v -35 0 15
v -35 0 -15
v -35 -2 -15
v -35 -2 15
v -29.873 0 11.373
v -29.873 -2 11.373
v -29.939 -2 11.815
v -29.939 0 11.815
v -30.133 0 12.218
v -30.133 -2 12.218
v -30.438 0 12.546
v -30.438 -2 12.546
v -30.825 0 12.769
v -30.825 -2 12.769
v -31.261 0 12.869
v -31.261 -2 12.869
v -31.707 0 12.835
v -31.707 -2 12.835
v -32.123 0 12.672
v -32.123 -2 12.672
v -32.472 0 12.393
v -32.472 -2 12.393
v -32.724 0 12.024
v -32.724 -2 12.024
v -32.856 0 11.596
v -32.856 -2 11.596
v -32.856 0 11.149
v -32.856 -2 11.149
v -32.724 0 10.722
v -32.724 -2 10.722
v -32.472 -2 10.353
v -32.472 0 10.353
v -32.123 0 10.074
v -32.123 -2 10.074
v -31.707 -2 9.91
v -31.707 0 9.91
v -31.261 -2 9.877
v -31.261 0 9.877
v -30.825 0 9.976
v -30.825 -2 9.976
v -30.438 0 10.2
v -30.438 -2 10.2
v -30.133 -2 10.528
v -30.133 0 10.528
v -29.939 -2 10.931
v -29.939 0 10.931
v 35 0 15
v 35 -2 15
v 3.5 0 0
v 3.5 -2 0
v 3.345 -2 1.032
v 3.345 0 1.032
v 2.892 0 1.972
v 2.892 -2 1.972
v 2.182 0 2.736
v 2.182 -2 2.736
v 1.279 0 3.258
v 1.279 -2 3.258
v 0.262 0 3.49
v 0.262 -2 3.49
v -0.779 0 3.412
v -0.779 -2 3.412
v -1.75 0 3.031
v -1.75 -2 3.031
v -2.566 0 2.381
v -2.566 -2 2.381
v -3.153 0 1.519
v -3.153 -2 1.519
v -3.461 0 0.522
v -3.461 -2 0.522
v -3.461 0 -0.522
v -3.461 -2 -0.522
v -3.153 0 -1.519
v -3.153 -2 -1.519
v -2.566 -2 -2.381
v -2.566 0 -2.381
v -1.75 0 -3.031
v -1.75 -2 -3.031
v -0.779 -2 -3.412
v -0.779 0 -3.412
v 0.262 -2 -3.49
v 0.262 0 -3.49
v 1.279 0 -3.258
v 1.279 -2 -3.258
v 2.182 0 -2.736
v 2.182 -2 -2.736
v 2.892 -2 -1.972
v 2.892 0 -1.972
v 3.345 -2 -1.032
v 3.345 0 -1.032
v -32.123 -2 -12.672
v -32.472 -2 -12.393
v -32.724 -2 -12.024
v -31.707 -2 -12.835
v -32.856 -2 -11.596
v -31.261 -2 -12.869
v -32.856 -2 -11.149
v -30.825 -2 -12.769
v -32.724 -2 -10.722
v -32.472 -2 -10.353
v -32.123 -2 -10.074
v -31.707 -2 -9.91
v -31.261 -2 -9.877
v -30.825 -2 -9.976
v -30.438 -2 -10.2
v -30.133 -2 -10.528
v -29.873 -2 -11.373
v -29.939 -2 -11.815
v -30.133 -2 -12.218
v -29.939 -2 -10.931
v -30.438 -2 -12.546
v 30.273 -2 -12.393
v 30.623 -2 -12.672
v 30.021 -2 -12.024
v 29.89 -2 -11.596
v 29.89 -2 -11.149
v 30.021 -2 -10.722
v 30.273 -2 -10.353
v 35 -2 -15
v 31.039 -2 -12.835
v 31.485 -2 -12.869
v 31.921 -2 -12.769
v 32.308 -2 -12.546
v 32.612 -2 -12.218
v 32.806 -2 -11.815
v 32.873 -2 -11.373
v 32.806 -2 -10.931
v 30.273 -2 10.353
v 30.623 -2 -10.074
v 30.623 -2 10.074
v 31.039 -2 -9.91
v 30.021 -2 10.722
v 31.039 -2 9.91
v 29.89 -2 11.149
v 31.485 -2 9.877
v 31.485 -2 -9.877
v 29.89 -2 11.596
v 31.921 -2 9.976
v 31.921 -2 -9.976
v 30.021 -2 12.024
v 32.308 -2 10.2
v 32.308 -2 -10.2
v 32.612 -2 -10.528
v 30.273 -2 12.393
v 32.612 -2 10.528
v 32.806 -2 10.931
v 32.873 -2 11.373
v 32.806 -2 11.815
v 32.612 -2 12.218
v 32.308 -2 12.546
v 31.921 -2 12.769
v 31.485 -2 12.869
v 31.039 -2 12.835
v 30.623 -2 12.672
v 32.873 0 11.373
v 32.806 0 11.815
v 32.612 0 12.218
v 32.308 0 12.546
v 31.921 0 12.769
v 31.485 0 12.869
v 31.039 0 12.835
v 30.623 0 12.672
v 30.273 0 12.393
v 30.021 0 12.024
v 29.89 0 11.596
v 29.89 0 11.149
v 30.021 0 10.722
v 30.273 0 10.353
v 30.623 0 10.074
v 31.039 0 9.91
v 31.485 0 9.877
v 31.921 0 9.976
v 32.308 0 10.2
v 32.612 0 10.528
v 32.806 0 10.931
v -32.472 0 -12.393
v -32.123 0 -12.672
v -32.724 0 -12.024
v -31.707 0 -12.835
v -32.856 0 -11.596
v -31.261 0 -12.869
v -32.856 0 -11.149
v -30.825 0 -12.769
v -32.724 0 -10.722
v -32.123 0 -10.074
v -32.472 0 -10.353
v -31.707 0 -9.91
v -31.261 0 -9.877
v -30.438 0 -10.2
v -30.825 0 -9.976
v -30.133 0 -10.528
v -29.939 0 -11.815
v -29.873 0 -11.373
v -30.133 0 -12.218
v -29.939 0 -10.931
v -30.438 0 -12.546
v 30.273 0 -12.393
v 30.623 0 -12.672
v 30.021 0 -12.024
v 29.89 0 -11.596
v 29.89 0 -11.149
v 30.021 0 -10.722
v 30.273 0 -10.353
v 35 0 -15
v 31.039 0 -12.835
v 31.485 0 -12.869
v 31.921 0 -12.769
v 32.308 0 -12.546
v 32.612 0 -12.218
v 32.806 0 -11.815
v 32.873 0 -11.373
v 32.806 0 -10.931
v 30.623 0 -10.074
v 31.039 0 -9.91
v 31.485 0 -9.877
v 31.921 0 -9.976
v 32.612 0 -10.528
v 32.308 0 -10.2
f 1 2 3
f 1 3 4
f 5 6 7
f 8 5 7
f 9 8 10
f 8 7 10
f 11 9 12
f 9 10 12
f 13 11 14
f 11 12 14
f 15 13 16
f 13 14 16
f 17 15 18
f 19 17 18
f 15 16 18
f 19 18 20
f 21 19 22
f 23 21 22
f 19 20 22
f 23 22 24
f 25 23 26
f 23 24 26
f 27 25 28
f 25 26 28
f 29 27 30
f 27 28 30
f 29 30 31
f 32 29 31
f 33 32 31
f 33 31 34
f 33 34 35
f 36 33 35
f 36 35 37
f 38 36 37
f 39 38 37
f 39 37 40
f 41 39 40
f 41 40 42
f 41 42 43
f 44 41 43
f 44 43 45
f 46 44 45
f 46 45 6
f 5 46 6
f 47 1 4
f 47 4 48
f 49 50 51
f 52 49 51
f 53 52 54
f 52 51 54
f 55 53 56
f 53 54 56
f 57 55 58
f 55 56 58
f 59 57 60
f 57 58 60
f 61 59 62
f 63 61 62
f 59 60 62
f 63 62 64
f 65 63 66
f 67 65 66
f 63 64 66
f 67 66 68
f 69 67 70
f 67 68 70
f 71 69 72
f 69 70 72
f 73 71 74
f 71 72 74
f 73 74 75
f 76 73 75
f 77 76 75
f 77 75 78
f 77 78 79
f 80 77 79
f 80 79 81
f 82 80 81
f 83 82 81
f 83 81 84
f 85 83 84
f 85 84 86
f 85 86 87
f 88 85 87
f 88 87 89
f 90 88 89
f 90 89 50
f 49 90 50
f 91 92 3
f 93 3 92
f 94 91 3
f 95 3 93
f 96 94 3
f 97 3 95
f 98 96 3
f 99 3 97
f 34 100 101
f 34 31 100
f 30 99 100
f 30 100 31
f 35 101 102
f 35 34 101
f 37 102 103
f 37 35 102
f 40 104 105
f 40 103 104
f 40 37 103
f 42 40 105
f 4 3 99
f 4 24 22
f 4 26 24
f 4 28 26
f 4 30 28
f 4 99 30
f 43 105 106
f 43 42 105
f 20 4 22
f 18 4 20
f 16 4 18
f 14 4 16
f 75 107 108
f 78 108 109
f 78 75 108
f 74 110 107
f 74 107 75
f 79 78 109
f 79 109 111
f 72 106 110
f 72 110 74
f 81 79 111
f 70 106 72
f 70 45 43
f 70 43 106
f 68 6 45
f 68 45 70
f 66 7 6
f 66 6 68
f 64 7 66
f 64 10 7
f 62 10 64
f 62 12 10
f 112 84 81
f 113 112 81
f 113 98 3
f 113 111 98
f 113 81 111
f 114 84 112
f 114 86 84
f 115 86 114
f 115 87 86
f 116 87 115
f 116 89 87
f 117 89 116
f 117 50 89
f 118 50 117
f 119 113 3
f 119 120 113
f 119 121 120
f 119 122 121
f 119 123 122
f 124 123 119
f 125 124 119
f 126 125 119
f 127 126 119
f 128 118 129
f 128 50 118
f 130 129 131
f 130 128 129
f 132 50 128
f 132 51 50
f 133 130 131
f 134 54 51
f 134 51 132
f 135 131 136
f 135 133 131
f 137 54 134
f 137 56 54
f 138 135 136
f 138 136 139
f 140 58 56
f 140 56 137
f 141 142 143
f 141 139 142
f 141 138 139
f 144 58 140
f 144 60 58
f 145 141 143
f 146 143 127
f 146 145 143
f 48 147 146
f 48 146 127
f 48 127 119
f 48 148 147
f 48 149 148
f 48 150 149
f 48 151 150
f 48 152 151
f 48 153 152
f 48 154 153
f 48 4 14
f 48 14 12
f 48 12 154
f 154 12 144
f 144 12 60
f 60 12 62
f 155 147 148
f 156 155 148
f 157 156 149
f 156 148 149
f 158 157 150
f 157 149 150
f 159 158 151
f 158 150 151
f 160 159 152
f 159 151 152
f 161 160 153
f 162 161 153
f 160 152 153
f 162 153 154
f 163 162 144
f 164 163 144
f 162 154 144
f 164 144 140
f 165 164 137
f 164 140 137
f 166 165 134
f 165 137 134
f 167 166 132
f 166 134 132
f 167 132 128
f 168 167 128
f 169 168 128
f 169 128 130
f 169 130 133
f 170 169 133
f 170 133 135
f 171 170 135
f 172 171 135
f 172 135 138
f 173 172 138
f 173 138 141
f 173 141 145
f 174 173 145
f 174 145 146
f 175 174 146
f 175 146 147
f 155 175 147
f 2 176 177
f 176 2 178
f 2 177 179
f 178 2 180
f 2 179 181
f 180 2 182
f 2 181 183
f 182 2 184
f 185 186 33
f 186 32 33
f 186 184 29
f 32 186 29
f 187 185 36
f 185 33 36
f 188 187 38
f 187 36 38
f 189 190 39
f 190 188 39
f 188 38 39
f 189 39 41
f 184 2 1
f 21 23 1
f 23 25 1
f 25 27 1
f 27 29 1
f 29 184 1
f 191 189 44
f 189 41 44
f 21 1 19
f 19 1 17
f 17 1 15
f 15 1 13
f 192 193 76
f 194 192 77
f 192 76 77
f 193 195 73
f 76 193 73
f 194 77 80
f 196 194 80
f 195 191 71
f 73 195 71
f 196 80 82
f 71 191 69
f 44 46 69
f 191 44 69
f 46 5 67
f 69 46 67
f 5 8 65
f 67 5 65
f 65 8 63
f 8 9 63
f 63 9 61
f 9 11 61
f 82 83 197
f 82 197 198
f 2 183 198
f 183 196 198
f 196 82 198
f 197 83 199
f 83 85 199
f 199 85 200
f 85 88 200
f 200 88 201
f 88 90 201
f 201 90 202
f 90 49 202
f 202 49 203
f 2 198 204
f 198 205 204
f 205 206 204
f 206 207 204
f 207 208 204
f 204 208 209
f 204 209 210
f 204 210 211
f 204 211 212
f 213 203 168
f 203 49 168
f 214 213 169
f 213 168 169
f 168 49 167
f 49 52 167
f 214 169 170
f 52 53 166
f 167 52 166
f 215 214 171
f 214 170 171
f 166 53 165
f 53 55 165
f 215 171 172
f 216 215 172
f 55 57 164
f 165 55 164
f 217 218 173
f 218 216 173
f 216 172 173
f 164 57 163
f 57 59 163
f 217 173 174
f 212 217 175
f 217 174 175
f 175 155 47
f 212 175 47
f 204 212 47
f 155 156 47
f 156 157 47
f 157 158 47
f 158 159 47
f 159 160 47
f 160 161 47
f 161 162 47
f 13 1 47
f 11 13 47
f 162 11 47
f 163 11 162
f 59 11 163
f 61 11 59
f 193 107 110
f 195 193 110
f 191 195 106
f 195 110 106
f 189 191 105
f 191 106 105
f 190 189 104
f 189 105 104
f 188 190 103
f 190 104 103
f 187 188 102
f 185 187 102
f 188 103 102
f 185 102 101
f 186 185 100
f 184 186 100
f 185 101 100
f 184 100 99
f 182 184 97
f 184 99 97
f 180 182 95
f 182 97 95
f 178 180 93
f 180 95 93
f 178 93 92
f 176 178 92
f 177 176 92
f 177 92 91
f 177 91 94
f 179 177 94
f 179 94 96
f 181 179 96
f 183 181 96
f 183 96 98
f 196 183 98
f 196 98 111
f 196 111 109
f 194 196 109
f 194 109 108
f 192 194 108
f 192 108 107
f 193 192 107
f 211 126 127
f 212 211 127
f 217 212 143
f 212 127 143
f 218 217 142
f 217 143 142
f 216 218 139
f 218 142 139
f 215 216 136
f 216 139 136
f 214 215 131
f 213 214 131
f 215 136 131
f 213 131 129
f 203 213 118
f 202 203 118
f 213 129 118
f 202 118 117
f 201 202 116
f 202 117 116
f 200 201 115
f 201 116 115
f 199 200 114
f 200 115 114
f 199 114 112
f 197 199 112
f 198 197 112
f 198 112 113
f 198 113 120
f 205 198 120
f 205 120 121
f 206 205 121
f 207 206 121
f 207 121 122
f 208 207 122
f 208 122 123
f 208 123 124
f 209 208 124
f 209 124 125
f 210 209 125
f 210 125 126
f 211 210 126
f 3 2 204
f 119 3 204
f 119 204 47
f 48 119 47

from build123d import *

# Parameters (mm, degrees)
F0_W     = 70
F0_H     = 30
F1_DEPTH = 2
F2_R     = 1.5
F3_DEPTH = 25
F4_R     = 3.5
F5_DEPTH = 2.001


with BuildPart() as f1:
    # F0 (on Front) → F1 (new body)
    with BuildSketch(Plane.XZ):
        Rectangle(F0_W, F0_H)
    extrude(amount=F1_DEPTH)

    # F2 (on face) → F3 (cut)
    with BuildSketch(Plane.XZ.offset(2)):
        with Locations((-31.372793, 11.372793)):
            Circle(F2_R)
        with Locations((31.372793, 11.372793)):
            Circle(F2_R)
        with Locations((-31.372793, -11.372793)):
            Circle(F2_R)
        with Locations((31.372793, -11.372793)):
            Circle(F2_R)
    extrude(amount=-F3_DEPTH, mode=Mode.SUBTRACT)

    # F4 (on face) → F5 (cut, through all)
    with BuildSketch(Plane.XZ.offset(2)):
        Circle(F4_R)
    extrude(amount=-F5_DEPTH, mode=Mode.SUBTRACT)


solid = f1.part
